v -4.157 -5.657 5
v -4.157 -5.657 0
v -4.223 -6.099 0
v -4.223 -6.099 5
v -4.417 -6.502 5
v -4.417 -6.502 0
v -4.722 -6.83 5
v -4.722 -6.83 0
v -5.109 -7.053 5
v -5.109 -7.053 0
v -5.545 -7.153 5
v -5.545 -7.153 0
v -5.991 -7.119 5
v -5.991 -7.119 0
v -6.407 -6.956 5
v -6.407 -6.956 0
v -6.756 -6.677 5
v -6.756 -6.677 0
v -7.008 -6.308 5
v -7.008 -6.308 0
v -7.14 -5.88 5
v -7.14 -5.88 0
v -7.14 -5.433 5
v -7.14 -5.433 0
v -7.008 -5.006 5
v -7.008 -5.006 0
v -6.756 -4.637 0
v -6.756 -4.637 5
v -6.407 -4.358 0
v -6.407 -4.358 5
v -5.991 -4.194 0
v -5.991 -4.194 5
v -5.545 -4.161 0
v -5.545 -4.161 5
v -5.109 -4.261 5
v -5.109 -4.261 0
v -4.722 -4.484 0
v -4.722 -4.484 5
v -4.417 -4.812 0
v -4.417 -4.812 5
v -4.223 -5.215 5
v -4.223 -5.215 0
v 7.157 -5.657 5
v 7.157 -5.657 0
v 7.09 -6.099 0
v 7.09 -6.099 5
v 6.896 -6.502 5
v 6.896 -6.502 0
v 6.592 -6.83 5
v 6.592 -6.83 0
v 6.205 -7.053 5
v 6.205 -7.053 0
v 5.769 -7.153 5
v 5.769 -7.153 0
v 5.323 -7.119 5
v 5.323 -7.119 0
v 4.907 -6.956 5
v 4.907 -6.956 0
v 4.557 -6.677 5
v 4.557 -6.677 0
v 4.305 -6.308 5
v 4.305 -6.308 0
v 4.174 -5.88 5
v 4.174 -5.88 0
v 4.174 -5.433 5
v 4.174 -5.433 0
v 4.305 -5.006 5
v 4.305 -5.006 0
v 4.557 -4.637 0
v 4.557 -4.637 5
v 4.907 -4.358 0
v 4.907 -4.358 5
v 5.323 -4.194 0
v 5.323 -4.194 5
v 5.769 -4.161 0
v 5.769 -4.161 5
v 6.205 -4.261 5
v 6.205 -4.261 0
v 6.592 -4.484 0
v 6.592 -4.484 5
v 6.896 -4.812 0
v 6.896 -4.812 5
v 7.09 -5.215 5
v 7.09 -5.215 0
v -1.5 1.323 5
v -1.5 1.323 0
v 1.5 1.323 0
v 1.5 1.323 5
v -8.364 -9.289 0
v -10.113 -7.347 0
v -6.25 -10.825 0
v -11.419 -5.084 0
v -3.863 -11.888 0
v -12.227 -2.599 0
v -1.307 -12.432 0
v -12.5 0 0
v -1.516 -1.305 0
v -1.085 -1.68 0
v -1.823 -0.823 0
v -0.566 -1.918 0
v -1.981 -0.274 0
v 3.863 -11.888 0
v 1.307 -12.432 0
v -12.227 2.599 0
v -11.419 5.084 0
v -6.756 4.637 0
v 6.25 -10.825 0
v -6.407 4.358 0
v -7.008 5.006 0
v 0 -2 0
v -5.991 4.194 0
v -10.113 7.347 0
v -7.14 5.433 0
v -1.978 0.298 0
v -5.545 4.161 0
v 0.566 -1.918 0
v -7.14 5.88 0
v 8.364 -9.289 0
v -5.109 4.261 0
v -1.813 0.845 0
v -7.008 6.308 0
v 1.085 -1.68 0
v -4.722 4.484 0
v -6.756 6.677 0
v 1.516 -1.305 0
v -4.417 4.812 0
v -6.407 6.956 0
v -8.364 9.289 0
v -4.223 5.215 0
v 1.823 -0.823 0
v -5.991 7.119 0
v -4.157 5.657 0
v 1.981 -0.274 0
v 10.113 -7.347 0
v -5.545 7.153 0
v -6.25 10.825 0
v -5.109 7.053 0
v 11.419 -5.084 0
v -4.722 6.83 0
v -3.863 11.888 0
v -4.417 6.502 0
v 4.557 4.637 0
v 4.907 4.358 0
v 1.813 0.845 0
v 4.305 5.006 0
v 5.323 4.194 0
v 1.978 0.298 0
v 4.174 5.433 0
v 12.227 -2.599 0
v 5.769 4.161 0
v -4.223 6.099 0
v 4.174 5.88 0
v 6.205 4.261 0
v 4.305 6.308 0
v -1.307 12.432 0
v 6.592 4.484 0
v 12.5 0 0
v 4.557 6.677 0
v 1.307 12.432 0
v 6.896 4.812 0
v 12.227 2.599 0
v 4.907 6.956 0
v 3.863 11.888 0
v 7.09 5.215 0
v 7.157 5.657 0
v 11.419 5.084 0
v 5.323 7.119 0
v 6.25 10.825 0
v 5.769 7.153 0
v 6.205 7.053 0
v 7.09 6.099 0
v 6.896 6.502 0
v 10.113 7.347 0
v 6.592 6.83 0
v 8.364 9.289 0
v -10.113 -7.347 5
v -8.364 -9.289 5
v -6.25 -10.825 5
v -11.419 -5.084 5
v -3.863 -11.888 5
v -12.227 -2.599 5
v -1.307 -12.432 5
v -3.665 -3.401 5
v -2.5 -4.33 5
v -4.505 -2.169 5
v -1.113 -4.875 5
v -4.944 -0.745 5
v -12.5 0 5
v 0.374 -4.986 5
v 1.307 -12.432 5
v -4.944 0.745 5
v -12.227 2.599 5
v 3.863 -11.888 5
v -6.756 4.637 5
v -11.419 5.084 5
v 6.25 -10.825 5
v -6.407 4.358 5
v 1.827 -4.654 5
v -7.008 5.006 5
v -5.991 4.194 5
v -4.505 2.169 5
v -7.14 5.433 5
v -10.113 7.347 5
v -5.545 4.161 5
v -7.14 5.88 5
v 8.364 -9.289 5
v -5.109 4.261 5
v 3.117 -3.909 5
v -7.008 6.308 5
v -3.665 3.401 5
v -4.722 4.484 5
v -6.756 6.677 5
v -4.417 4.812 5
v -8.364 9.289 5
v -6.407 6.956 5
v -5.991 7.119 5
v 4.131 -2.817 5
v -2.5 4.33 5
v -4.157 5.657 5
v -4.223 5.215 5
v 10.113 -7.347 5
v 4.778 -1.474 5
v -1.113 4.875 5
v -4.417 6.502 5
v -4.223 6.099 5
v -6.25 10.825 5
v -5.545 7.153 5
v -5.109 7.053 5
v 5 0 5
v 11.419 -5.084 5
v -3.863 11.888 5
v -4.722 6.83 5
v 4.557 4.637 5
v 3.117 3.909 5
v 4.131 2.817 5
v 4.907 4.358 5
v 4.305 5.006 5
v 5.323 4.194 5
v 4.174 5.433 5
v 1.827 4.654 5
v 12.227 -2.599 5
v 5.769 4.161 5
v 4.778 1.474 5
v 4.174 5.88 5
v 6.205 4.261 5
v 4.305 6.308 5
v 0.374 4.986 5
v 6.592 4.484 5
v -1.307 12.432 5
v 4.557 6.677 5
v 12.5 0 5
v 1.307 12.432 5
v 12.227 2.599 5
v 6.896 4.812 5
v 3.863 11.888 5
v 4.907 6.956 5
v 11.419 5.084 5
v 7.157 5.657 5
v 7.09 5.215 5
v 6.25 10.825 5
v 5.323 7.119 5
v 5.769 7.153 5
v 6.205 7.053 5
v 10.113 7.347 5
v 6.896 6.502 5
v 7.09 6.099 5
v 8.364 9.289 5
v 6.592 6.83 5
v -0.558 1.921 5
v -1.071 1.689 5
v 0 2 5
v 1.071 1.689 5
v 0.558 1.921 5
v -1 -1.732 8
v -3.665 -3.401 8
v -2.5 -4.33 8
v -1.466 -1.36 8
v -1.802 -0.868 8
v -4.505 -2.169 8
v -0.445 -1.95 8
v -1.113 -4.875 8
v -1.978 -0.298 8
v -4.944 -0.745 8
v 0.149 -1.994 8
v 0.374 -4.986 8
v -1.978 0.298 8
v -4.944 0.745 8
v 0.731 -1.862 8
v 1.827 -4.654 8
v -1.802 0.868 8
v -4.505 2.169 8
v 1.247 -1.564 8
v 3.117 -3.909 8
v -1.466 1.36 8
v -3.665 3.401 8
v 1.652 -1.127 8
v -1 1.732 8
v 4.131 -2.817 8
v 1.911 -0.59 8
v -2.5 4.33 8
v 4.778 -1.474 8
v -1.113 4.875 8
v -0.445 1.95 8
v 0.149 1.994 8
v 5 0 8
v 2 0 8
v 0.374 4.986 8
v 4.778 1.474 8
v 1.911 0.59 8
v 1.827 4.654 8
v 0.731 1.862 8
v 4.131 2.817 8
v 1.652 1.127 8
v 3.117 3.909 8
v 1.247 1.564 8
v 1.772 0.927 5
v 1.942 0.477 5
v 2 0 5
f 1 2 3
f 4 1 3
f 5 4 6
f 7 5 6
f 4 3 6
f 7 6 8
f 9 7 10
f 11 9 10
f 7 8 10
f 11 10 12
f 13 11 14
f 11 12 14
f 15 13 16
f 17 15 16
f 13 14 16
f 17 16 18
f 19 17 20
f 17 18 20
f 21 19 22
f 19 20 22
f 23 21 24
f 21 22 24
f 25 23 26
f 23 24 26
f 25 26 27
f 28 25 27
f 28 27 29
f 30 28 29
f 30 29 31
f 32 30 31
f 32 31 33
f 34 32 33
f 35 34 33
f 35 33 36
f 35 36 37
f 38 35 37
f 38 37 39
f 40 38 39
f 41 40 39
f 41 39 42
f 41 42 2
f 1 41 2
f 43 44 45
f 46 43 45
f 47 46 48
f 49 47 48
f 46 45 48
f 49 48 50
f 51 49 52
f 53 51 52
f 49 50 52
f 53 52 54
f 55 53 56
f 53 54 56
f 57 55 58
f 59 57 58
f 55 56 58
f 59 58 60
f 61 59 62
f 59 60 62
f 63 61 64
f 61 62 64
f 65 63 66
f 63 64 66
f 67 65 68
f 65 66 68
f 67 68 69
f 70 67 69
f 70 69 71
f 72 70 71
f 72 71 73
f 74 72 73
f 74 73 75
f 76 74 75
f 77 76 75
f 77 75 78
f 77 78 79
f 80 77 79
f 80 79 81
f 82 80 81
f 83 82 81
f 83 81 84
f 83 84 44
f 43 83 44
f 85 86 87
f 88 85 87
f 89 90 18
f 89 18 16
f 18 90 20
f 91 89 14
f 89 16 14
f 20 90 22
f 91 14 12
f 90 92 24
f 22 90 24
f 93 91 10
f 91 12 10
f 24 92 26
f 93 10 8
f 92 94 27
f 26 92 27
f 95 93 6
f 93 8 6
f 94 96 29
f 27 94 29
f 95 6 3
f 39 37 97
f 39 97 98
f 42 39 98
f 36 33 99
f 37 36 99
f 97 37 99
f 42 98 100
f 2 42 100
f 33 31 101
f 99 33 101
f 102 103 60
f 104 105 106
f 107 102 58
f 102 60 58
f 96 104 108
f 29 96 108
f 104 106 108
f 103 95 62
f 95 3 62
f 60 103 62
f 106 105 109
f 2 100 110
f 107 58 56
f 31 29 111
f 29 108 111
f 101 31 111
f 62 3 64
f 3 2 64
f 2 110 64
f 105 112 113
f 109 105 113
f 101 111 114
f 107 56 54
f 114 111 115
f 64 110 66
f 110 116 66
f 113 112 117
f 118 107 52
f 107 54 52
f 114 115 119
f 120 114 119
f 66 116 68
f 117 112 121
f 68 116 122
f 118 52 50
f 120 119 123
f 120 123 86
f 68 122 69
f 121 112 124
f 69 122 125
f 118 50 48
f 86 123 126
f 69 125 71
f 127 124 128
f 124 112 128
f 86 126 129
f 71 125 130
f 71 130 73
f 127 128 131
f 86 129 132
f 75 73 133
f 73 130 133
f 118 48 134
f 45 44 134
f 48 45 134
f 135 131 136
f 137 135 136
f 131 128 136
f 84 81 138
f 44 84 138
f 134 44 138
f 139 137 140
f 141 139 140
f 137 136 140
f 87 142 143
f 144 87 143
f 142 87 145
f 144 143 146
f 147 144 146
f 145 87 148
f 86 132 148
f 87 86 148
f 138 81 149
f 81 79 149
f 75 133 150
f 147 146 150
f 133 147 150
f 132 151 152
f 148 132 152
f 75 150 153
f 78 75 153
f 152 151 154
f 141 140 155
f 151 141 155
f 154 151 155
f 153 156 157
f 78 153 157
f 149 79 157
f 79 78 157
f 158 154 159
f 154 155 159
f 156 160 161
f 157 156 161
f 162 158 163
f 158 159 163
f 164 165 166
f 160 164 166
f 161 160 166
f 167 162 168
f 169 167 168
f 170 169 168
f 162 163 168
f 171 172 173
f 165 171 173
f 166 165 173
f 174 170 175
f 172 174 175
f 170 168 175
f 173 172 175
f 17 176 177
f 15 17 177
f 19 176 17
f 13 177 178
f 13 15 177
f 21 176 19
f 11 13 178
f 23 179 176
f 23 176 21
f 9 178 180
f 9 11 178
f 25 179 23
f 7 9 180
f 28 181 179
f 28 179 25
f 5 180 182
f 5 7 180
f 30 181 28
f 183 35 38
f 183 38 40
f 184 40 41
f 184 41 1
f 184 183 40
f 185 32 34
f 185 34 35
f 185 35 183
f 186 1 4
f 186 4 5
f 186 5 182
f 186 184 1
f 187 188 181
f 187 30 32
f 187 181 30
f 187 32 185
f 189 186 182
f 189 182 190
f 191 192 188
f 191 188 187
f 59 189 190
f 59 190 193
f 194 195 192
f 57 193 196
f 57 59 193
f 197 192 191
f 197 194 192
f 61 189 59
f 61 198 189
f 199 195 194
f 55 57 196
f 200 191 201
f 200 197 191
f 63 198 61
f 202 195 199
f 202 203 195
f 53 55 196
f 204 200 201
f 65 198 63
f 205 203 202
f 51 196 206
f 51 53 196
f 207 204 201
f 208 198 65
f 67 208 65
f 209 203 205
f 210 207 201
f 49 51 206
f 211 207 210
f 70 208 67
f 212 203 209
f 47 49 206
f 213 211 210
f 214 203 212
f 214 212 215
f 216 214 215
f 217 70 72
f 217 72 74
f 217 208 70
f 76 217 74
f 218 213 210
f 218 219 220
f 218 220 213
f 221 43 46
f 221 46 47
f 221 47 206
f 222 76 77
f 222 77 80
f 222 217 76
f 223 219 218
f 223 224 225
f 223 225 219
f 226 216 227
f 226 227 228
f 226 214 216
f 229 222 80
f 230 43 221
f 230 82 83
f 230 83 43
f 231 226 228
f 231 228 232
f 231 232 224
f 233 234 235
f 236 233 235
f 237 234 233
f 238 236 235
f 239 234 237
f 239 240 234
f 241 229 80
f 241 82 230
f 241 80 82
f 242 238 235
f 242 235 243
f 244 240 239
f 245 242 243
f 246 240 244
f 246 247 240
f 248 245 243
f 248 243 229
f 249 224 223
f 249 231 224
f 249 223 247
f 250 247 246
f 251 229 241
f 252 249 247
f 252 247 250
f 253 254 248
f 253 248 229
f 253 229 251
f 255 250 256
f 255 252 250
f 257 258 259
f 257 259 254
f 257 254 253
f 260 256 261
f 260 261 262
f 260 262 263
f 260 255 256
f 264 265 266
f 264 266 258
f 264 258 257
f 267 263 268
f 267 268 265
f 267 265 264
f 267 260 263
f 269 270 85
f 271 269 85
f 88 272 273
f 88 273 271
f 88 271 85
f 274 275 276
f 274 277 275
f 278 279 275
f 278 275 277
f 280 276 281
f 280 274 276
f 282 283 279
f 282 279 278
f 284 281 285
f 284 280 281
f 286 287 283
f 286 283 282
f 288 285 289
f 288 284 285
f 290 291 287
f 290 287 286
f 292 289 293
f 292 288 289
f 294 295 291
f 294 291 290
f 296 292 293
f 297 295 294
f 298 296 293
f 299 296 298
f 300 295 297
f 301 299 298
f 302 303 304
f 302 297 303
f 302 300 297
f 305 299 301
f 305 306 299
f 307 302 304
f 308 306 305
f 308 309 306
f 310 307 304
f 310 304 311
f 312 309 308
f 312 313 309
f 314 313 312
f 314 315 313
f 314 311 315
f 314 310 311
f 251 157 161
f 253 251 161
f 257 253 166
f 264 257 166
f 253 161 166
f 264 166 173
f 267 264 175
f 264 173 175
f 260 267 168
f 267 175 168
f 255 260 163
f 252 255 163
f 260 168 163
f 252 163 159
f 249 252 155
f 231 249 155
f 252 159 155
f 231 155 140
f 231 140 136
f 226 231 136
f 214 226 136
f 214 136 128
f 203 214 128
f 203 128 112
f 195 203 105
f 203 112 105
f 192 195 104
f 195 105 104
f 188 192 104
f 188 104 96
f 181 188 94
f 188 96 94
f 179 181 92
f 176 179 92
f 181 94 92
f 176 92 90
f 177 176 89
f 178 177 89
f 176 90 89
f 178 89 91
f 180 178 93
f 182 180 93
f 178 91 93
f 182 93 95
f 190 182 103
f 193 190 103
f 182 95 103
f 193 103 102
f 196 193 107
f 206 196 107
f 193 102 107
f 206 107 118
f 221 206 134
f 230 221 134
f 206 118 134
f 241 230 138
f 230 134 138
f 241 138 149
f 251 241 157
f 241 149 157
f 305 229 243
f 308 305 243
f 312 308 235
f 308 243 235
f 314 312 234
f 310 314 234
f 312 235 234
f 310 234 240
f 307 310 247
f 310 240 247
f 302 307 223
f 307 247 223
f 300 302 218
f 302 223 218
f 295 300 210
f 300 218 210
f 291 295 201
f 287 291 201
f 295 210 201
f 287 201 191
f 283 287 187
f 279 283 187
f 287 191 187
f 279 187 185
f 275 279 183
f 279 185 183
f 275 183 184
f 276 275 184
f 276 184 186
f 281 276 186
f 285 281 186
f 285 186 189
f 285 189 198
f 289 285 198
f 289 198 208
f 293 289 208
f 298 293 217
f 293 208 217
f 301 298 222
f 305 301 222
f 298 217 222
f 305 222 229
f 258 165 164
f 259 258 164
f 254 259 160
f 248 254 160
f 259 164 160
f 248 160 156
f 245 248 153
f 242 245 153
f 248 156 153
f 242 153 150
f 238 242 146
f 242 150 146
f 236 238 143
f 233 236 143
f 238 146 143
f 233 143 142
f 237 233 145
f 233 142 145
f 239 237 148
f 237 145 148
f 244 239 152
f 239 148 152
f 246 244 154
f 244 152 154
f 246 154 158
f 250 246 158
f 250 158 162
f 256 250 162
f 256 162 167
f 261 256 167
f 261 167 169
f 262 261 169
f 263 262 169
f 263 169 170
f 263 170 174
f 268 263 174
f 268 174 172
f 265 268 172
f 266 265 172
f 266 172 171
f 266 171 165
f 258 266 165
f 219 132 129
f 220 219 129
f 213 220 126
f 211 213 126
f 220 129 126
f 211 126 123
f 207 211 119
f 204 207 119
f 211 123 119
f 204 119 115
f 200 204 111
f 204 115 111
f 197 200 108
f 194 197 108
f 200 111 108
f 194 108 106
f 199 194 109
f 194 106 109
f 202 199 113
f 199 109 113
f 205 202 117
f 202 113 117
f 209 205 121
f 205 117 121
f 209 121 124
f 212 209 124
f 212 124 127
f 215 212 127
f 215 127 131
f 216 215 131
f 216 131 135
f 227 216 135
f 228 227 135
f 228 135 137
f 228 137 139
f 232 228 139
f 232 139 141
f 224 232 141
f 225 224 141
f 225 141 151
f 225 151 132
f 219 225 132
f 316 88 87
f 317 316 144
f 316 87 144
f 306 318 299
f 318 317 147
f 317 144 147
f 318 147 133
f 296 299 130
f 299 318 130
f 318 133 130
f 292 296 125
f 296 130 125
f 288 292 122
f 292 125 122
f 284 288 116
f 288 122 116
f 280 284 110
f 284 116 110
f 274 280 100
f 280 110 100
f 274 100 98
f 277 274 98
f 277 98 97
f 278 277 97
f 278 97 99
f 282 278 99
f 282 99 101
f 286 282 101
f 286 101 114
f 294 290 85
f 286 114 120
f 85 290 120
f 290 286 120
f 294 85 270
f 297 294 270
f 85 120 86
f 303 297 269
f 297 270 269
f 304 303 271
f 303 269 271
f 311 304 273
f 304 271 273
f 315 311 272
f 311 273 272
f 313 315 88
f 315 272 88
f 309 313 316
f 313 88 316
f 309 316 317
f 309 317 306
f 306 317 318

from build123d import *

# Parameters (mm, degrees)
F0_R     = 12.5
F1_DEPTH = 5
F2_R     = 5
F3_DEPTH = 3
F4_R     = 2
F5_DEPTH = 3
F7_DEPTH = 25
F8_R     = 1.5
F9_DEPTH = 25


with BuildPart() as f1:
    # F0 (on Top) → F1 (new body)
    with BuildSketch(Plane.XY):
        Circle(F0_R)
    extrude(amount=F1_DEPTH)

    # F2 (on face) → F3 (join)
    with BuildSketch(Plane.XY.offset(5)):
        Circle(F2_R)
    extrude(amount=F3_DEPTH)

    # F4 (on face) → F5 (cut)
    with BuildSketch(Plane.XY.offset(8)):
        Circle(F4_R)
    extrude(amount=-F5_DEPTH, mode=Mode.SUBTRACT)

    # F6 (on face) → F7 (cut)
    with BuildSketch(Plane(origin=(0, 0, 0), x_dir=(1, 0, 0), z_dir=(0, 0, -1))):
        with BuildLine():
            Line((-1.5, -1.3228756555), (1.5, -1.3228756555))
            ThreePointArc((1.5, -1.3228756555), (0, 2), (-1.5, -1.3228756555))
        make_face()
    extrude(amount=-F7_DEPTH, mode=Mode.SUBTRACT)

    # F8 (on face) → F9 (cut)
    with BuildSketch(Plane(origin=(0, 0, 0), x_dir=(1, 0, 0), z_dir=(0, 0, -1))):
        with Locations((-5.6568542495, 5.6568542495)):
            Circle(F8_R)
        with Locations((-5.6568542495, -5.6568542495)):
            Circle(F8_R)
        with Locations((5.6568542495, -5.6568542495)):
            Circle(F8_R)
        with Locations((5.6568542495, 5.6568542495)):
            Circle(F8_R)
    extrude(amount=-F9_DEPTH, mode=Mode.SUBTRACT)


solid = f1.part
